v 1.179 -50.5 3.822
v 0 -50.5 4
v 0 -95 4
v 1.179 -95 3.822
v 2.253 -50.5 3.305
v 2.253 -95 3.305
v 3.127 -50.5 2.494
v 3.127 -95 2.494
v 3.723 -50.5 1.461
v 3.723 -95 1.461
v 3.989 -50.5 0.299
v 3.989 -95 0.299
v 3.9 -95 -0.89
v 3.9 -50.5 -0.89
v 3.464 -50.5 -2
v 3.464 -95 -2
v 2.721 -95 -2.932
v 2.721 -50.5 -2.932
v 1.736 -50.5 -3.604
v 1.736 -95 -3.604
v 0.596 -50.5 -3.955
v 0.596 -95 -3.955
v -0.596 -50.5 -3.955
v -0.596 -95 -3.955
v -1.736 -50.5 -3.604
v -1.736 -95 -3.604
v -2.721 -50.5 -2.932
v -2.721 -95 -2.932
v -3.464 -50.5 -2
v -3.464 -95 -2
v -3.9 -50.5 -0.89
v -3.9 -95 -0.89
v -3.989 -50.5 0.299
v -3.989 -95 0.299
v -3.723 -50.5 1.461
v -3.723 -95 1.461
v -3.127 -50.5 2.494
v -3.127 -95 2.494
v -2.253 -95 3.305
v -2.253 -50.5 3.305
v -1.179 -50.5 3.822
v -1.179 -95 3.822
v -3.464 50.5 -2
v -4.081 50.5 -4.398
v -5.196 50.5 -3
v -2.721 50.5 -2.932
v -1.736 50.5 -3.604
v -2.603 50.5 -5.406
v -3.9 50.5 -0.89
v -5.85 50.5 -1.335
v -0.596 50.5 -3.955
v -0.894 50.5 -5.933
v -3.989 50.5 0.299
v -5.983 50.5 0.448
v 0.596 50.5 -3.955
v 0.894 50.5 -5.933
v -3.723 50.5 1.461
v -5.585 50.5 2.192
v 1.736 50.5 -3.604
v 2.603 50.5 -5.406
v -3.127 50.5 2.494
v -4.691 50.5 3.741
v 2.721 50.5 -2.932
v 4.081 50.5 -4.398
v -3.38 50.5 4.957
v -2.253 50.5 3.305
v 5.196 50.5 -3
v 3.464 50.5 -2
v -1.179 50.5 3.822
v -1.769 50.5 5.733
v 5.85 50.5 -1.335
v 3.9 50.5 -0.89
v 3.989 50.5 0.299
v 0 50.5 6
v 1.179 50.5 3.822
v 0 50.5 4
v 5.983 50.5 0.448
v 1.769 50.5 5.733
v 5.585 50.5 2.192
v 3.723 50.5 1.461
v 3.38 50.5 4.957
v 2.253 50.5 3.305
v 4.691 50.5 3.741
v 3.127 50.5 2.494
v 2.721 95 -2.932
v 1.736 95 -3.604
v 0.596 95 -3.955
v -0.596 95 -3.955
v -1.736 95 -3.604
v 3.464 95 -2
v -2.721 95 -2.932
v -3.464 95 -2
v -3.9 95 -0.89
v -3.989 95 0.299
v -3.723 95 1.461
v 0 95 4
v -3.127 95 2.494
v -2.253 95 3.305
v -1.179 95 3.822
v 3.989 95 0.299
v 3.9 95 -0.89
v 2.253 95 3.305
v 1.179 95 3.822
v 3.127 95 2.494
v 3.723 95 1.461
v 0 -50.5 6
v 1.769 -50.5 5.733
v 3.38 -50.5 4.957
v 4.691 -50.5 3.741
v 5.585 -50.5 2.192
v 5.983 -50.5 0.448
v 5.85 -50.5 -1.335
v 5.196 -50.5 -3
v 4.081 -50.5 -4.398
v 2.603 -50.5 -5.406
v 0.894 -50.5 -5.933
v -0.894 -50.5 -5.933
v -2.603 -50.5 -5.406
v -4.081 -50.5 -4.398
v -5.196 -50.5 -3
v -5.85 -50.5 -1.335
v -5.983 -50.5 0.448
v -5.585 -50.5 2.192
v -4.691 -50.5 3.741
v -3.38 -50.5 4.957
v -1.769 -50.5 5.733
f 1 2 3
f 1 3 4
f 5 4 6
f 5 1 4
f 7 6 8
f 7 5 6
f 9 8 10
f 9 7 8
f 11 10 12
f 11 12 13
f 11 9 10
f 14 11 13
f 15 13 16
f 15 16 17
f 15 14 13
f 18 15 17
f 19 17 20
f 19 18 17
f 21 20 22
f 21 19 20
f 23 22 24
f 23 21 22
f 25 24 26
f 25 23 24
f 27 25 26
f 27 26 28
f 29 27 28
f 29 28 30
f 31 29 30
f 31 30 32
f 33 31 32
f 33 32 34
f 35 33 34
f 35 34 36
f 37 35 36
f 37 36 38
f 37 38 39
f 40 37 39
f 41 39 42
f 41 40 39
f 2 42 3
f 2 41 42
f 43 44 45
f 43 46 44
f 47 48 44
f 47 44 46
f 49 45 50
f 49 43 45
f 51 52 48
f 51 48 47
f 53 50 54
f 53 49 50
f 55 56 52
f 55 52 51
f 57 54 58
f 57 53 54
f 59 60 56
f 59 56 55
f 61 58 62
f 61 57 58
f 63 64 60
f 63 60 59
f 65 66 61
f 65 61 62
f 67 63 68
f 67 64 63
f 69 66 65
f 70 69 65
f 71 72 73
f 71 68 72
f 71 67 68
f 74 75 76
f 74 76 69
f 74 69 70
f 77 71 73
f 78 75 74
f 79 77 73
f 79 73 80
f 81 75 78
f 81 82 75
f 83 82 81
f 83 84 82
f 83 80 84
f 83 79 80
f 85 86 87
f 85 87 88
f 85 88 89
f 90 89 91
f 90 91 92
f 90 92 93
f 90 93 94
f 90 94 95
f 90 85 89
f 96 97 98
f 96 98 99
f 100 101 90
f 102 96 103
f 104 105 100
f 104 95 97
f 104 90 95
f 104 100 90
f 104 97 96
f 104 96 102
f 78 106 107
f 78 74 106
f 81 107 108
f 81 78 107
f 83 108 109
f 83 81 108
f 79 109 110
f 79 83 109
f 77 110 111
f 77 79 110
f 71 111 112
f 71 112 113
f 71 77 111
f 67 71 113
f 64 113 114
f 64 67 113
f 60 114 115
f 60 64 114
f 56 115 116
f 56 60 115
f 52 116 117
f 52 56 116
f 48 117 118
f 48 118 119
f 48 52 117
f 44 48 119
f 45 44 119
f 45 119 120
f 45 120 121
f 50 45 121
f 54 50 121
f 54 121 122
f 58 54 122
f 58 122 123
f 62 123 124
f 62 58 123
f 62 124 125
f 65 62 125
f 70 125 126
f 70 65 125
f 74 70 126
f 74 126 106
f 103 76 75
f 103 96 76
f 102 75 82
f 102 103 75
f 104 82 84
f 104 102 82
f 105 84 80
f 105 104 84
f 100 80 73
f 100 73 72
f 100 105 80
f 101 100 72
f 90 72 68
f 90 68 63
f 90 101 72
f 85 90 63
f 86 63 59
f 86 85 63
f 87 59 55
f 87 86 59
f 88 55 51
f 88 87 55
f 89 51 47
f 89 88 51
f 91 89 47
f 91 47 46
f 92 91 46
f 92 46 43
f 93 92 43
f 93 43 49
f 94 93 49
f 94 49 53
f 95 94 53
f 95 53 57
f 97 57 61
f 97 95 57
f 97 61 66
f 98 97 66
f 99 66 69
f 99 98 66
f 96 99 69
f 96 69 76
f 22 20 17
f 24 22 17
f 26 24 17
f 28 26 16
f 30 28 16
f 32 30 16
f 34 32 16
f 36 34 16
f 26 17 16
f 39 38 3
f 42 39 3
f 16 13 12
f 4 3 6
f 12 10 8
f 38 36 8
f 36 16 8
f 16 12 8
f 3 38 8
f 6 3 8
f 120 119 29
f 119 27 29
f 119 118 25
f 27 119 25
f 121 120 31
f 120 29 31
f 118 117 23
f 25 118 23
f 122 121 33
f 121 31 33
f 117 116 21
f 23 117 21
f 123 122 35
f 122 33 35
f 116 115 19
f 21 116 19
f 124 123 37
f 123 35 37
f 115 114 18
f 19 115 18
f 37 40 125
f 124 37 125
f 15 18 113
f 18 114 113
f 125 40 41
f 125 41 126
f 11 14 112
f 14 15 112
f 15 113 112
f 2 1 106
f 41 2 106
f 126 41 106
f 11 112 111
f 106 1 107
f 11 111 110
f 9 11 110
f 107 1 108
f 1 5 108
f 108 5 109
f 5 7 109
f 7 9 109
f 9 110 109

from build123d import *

# Parameters (mm, degrees)
SKETCH1_R           = 4
BOSS_EXTRUDE1_DEPTH = 95
SKETCH1_3_R         = 6
SKETCH1_3_R_2       = 4
BOSS_EXTRUDE2_DEPTH = 50.5


with BuildPart() as part:
    # Sketch1 → Boss-Extrude1 (new, symmetric)
    with BuildSketch(Plane(origin=(0, 0, 0), x_dir=(1, 0, 0), z_dir=(0, 1, 0))):
        Circle(SKETCH1_R)
    extrude(amount=BOSS_EXTRUDE1_DEPTH, both=True)

    # Sketch1<3> → Boss-Extrude2 (add, symmetric)
    with BuildSketch(Plane(origin=(0, 0, 0), x_dir=(1, 0, 0), z_dir=(0, 1, 0))):
        Circle(SKETCH1_3_R)
        Circle(SKETCH1_3_R_2, mode=Mode.SUBTRACT)
    extrude(amount=BOSS_EXTRUDE2_DEPTH, both=True)


solid = part.part
